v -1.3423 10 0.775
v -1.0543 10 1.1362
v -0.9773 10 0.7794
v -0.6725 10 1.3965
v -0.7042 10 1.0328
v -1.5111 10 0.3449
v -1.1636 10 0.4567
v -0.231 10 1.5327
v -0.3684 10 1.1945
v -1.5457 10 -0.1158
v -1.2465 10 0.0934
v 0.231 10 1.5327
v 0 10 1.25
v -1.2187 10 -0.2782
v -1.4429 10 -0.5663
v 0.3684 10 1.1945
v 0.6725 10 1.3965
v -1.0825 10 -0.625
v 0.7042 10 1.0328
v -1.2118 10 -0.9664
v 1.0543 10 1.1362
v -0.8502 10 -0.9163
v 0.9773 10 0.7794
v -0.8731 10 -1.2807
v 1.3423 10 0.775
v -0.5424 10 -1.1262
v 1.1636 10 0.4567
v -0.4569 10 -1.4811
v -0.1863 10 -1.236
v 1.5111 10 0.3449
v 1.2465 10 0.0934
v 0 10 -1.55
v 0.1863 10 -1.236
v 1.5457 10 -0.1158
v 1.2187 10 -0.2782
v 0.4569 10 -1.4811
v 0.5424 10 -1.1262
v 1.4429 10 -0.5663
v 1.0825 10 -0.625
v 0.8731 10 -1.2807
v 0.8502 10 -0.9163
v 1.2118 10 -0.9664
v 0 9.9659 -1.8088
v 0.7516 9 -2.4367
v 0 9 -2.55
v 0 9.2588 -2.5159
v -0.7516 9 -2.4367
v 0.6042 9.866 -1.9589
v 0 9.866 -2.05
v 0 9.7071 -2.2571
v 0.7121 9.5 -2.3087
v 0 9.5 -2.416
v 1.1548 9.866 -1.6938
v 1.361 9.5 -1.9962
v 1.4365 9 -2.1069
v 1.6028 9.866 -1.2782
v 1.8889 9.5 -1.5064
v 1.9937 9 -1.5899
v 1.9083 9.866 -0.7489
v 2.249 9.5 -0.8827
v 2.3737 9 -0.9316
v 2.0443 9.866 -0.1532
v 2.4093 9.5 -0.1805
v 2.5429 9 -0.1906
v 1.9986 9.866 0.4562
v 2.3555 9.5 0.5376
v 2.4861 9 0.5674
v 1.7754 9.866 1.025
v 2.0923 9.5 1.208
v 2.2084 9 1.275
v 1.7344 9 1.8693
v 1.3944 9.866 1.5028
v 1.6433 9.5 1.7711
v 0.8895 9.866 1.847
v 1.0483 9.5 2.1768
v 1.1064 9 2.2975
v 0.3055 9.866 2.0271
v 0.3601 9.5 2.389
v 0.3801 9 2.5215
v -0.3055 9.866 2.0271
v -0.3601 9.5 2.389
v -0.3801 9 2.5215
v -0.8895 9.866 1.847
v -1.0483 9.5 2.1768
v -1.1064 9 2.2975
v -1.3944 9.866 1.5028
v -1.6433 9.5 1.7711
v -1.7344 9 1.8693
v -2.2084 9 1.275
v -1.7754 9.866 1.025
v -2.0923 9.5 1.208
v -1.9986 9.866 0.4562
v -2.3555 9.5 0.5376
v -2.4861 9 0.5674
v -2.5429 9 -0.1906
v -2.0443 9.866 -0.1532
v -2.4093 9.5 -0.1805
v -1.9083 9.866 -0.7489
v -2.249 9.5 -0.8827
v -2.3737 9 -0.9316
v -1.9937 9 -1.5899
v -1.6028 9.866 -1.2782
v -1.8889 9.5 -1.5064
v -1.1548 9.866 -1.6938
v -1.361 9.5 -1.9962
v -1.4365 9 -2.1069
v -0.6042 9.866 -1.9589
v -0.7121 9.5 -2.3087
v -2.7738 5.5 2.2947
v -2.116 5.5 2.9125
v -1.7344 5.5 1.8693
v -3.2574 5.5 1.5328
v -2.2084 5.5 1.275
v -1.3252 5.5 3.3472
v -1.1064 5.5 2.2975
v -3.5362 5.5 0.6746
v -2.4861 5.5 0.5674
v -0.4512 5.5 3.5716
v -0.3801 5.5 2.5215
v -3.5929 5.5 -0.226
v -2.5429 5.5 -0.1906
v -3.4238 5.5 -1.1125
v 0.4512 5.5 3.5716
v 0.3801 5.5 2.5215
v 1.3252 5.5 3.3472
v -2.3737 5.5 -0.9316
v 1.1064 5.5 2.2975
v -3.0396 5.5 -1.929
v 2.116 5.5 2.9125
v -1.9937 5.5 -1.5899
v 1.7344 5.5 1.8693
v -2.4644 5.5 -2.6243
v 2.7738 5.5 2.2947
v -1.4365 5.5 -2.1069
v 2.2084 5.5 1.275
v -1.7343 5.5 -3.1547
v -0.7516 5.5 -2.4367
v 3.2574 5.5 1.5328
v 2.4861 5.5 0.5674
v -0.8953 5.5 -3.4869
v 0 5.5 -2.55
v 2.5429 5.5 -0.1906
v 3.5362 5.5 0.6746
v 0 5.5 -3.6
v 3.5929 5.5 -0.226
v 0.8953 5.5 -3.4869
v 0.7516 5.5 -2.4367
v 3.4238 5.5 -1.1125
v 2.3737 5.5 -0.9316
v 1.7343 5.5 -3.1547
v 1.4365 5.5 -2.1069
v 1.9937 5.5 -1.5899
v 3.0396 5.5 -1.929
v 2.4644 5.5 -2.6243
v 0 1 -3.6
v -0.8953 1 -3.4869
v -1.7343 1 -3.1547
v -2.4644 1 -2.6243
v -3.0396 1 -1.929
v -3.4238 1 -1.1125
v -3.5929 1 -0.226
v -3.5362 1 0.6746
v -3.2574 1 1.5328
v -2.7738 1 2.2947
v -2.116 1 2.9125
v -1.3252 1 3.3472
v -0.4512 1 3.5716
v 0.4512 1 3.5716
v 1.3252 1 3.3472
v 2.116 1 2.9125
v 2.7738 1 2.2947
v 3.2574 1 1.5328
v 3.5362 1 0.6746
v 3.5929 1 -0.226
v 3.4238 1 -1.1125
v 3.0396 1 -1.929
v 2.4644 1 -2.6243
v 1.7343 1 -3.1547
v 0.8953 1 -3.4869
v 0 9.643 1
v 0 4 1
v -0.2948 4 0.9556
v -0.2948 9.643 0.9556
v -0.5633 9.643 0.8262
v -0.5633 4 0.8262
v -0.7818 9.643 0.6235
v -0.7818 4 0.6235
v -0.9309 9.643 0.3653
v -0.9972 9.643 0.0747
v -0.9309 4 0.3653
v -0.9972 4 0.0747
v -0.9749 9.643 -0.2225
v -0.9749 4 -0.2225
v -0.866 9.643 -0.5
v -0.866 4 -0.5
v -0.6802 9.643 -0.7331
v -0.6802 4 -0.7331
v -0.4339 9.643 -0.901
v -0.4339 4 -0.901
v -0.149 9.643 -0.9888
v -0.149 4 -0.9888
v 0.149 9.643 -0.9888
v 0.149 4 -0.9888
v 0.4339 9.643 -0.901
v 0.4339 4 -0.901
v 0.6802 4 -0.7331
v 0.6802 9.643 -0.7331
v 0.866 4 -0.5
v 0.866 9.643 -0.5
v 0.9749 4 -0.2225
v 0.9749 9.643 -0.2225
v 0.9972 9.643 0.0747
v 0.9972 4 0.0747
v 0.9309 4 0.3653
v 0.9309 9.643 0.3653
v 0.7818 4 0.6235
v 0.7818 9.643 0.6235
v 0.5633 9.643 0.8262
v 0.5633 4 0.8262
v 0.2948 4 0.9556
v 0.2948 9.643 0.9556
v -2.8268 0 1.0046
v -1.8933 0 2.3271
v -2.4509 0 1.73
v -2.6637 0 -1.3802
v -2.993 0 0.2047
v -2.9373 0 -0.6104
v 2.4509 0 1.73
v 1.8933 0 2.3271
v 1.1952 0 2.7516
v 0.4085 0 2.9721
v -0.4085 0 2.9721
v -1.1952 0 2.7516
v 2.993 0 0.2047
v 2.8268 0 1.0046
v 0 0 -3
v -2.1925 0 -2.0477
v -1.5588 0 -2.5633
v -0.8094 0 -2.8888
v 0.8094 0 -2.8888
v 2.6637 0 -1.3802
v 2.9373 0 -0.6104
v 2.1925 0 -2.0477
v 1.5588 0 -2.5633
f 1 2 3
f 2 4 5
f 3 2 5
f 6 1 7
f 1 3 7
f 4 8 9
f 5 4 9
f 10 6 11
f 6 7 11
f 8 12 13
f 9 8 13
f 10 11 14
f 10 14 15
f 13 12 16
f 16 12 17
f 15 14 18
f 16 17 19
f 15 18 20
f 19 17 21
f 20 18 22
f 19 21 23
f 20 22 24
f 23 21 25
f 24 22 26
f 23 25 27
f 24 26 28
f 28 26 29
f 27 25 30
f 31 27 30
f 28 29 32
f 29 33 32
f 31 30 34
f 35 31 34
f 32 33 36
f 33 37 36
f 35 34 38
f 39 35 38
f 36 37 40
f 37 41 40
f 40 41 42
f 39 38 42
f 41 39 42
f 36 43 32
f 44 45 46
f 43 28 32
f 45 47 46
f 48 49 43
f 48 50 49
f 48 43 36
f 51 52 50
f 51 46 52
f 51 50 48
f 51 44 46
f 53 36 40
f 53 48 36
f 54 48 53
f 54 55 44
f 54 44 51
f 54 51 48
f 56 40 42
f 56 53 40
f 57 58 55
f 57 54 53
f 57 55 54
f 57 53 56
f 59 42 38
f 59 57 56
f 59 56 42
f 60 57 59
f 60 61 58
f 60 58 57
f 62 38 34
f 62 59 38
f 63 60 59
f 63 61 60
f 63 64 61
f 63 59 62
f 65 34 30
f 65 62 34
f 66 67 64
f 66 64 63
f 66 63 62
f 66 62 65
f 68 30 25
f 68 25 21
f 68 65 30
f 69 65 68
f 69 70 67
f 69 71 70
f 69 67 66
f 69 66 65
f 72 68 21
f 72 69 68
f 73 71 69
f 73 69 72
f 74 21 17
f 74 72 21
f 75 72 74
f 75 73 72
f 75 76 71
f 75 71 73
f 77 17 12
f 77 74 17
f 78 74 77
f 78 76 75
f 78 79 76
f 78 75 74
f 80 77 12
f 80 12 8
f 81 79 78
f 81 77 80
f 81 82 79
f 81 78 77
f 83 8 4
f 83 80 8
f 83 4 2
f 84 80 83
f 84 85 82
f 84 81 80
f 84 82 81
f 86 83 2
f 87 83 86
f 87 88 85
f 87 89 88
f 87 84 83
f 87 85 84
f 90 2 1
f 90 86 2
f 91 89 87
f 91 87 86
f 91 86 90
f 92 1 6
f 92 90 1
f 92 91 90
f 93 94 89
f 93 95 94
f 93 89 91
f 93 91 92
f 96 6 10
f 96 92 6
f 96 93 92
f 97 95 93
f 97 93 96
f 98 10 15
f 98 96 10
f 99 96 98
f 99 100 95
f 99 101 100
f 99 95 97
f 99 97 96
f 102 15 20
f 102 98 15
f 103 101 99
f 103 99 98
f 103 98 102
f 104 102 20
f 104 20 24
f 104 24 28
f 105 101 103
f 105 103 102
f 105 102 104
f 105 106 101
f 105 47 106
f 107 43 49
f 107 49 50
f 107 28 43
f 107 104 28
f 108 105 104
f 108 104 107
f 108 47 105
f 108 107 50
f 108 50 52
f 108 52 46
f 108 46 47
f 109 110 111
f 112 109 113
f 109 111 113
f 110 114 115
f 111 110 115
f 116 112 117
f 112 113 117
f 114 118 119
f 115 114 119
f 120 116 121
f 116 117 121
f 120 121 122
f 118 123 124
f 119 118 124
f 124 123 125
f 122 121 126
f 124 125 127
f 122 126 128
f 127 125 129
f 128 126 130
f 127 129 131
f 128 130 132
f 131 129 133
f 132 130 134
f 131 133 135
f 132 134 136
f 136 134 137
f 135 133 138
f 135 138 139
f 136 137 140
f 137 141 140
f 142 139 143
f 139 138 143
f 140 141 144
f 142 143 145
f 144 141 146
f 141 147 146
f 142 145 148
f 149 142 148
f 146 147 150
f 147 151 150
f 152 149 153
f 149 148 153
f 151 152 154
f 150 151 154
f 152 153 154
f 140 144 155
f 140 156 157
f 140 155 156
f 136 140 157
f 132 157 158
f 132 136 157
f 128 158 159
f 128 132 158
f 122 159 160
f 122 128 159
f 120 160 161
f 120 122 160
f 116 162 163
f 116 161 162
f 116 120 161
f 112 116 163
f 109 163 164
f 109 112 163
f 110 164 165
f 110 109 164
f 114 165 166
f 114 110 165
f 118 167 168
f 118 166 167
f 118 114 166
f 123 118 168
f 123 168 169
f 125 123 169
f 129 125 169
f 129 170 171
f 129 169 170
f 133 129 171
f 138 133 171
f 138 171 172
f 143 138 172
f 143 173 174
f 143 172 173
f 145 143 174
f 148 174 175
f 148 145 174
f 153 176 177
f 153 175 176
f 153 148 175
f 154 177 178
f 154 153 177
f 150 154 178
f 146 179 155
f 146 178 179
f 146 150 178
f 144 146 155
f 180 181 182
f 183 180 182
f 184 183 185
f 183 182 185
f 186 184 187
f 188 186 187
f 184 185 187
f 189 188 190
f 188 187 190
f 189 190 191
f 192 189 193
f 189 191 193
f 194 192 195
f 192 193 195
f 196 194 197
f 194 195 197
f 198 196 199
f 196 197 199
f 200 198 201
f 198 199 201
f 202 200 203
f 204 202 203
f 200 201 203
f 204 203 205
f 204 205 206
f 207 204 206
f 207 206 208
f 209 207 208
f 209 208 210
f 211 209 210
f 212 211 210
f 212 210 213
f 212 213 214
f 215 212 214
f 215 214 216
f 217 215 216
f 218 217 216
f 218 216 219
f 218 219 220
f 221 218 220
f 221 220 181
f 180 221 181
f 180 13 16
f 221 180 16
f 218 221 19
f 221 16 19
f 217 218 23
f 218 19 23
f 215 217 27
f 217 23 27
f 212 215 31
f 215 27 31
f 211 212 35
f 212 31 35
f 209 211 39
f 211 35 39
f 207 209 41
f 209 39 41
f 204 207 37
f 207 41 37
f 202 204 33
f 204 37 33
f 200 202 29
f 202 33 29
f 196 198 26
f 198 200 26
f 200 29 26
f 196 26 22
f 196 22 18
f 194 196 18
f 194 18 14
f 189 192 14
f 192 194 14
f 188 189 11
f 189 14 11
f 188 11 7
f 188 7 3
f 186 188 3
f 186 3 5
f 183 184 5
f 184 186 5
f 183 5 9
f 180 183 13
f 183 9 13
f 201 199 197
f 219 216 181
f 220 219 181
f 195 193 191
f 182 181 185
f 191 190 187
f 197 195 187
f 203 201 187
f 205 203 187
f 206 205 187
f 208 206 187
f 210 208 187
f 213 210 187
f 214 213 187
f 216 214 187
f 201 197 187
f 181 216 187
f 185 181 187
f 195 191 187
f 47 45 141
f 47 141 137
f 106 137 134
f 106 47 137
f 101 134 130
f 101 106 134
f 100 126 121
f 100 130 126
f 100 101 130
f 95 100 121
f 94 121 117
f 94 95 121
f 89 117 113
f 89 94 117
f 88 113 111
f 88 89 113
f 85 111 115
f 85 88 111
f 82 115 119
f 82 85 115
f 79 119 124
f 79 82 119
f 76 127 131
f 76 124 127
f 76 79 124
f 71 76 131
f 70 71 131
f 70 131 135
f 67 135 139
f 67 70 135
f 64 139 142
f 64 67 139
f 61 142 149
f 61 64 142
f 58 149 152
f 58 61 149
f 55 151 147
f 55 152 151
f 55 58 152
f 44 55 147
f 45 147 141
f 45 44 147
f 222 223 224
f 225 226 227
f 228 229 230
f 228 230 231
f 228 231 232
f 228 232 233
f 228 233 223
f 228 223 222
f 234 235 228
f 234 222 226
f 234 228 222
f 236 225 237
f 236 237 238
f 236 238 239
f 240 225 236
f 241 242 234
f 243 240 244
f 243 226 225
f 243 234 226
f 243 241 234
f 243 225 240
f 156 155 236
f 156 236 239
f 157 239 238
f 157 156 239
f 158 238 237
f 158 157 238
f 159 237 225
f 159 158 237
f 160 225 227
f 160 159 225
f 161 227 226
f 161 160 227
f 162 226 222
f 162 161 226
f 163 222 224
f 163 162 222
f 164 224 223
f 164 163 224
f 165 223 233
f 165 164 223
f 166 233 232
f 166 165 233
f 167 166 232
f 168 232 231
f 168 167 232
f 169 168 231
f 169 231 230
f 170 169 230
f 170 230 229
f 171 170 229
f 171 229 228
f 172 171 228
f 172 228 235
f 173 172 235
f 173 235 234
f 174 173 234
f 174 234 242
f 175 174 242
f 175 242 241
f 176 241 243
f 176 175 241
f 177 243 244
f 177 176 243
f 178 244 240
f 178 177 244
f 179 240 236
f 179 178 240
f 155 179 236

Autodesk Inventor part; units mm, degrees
ref_plane "YZ Plane" through (0, 0, 0) normal (1, 0, 0) x (0, 1, 0)
ref_plane "XZ Plane" through (0, 0, 0) normal (0, 1, 0) x (-1, 0, 0)
ref_plane "XY Plane" through (0, 0, 0) normal (0, 0, 1) x (1, 0, 0)
sketch "Sketch3" plane through (0, 0, 0) normal (1, 0, 0) x (0, 1, 0)
  line L0 (0, 0) -> (0, -3.6)
  line L1 (0, -3.6) -> (5.5, -3.6)
  line L2 (5.5, -3.6) -> (5.5, -2.55)
  line L3 (5.5, -2.55) -> (10, -2.55)
  line L4 (10, -2.55) -> (10, 0)
  line L5 (10, 0) -> (0, 0)
  dimension "baseRadius" = 3.6
  dimension "d12" = 10
  dimension "d13" = 2.55
  dimension "baseHeight" = 5.5
revolve "Revolution1" add sketch "Sketch3" angle 360 about axis through (0, 10, 0) along (0, -1, 0)
sketch "Sketch4" plane through (0, 10, 0) normal (0, 1, 0) x (1, 0, 0)
  point P0 (0, 0)
hole "Hole2" at (0, 10, 0) direction (0, -1, 0) diameter 2 depth 6 countersink diameter 2.5 countersink angle 70
fillet "Fillet2" radius 1 1 edges at (0, 10, 2.55)
chamfer "Chamfer1" distance 0.6 distance2 1 1 edges at (0, 0, 3.6) measured on face at (0.7957, 0, -0.8982)
properties part number "stylus_nib_base"
